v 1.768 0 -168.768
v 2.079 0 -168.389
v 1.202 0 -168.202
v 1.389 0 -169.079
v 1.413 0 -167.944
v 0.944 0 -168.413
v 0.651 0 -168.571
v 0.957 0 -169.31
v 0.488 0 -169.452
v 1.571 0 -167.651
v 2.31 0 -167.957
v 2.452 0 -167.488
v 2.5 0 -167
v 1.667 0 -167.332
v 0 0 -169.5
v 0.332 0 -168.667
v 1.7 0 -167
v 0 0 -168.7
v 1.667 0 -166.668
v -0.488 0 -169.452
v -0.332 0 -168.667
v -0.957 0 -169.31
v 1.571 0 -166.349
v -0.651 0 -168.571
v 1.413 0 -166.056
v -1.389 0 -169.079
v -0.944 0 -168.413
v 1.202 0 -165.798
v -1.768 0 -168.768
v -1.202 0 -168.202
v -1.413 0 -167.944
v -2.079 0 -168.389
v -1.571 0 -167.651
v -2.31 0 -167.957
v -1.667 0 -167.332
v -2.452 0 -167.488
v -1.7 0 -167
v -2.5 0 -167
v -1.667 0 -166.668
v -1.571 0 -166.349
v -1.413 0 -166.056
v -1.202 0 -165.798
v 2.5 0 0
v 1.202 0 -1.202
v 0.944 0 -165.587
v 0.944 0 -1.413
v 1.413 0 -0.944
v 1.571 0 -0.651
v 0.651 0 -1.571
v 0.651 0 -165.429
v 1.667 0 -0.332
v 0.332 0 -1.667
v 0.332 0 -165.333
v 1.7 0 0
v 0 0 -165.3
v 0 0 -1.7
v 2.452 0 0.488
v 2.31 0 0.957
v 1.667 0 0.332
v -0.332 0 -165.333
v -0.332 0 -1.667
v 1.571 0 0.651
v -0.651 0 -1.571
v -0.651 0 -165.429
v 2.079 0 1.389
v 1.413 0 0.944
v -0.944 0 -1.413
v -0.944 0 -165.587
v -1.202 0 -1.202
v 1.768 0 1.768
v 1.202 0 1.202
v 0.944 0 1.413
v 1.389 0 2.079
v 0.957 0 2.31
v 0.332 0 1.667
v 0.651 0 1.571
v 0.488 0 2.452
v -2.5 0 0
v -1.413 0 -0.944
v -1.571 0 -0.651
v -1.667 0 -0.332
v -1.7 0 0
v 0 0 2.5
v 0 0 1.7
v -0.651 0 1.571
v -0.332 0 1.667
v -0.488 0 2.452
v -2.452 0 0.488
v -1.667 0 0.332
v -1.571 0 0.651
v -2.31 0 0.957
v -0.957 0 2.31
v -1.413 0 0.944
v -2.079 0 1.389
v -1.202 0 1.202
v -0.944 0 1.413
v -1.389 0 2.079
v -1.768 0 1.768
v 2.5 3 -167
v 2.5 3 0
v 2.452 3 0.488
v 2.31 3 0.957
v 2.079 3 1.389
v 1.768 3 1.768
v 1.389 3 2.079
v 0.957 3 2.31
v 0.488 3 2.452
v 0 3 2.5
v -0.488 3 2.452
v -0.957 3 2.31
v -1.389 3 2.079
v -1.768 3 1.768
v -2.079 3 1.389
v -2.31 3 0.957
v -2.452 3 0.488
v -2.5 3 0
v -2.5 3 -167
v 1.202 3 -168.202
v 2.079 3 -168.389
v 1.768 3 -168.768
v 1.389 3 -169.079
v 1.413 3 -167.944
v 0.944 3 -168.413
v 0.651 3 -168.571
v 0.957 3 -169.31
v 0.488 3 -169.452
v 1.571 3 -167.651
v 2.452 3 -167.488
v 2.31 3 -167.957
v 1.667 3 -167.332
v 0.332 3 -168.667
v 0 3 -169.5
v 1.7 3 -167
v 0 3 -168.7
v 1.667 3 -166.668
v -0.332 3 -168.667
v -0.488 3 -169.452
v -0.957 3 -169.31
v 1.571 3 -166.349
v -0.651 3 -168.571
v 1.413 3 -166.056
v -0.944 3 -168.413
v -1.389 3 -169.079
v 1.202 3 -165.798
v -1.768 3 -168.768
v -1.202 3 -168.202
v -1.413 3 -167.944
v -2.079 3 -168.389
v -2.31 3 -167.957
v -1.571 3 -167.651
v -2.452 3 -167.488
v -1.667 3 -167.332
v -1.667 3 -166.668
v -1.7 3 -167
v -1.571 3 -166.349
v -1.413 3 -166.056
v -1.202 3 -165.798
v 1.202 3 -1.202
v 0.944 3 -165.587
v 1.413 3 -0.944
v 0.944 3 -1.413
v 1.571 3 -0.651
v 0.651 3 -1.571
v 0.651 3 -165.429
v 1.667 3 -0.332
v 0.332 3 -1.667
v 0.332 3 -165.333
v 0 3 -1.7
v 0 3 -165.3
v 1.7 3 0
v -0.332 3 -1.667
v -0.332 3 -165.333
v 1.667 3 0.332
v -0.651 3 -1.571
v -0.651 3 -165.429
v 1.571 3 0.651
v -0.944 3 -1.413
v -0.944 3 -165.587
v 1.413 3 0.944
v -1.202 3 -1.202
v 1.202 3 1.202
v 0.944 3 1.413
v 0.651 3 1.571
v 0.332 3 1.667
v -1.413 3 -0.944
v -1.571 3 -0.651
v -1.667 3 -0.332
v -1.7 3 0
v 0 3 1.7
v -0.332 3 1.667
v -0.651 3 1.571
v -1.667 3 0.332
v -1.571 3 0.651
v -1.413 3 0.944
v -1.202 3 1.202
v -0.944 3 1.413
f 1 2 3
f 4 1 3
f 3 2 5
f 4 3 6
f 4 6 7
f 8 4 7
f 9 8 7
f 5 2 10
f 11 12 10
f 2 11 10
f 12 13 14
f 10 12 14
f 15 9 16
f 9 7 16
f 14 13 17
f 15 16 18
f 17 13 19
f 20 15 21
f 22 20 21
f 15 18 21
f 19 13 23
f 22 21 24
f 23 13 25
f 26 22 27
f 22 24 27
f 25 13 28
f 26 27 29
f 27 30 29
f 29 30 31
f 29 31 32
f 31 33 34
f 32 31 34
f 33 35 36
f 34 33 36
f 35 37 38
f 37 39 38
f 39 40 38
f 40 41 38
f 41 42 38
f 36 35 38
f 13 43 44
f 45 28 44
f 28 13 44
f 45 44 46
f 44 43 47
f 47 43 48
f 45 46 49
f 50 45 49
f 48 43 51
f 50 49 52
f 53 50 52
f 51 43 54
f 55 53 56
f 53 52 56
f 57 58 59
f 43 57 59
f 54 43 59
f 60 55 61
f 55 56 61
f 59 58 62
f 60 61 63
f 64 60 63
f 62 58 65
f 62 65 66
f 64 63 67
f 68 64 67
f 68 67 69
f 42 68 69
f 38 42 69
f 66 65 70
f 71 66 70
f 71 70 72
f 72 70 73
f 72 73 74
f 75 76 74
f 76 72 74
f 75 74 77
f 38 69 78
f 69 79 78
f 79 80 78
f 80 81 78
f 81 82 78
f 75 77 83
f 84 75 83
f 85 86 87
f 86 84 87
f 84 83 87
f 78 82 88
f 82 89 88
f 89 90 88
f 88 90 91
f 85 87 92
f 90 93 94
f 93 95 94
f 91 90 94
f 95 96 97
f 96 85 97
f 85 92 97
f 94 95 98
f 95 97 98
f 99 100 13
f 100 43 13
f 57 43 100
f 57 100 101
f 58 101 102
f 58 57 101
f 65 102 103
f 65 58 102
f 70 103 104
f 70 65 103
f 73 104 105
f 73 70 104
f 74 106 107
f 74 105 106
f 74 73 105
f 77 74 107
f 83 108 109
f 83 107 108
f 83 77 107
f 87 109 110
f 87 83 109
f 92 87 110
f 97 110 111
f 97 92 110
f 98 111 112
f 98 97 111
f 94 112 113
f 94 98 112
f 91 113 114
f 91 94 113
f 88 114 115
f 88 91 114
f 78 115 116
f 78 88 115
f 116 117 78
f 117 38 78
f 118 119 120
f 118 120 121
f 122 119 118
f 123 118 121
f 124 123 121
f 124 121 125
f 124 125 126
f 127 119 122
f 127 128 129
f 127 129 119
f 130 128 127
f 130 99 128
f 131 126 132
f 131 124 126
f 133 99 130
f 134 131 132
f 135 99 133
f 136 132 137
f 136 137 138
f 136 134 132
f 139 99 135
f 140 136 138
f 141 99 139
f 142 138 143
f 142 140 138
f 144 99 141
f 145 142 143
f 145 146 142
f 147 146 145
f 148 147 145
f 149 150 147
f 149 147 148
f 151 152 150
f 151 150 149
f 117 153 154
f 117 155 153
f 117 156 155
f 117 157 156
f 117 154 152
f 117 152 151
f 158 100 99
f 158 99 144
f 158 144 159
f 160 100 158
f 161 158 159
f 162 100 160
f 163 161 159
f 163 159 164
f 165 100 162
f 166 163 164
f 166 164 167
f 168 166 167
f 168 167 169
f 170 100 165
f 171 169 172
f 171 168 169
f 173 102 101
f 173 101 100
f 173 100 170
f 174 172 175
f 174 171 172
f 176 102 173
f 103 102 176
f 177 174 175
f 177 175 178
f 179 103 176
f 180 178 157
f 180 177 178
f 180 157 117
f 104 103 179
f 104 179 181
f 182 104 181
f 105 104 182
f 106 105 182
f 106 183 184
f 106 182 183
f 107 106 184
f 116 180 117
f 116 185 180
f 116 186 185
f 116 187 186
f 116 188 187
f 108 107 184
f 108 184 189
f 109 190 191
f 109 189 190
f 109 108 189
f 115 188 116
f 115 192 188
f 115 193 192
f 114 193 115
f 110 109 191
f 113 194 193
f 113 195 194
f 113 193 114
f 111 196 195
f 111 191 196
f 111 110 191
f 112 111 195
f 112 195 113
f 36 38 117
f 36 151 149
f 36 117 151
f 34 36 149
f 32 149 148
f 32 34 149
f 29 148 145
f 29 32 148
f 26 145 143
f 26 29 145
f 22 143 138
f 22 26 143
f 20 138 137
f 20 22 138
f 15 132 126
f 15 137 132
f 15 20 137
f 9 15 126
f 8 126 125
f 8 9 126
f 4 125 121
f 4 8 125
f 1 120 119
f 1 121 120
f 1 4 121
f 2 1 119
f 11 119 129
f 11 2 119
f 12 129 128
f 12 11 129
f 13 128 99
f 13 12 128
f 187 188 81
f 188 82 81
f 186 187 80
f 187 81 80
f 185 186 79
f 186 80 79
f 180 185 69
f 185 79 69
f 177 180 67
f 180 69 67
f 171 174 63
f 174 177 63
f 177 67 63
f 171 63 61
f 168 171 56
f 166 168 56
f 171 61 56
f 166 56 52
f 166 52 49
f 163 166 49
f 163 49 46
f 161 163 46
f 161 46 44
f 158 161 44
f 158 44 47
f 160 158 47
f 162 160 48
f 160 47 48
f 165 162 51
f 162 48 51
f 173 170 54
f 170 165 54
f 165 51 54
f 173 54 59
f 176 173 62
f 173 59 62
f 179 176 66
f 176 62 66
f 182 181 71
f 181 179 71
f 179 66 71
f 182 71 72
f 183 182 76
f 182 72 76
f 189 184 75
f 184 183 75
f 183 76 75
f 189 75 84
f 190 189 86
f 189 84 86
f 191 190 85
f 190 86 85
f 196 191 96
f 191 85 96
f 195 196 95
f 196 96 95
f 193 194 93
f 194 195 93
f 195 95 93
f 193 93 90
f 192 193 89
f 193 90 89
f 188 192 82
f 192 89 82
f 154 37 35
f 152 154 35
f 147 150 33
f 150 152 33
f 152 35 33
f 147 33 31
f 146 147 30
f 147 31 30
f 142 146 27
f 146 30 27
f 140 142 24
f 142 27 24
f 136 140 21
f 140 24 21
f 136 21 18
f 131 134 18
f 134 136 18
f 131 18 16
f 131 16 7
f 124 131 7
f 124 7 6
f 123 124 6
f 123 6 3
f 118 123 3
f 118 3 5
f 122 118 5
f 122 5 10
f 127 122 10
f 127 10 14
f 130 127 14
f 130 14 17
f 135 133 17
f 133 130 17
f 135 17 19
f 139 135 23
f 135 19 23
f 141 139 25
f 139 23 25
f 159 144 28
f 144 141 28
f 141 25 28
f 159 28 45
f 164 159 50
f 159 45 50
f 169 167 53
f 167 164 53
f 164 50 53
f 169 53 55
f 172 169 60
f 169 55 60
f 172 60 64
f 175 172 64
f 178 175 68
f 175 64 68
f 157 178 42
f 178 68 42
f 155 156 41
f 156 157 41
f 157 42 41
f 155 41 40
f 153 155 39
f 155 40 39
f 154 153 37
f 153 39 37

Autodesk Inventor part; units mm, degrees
ref_plane "YZ Plane" through (0, 0, 0) normal (1, 0, 0) x (0, 1, 0)
ref_plane "XZ Plane" through (0, 0, 0) normal (0, 1, 0) x (-1, 0, 0)
ref_plane "XY Plane" through (0, 0, 0) normal (0, 0, 1) x (1, 0, 0)
sketch "Sketch1" plane through (0, 0, 0) normal (0, 1, 0) x (-1, 0, 0)
  line L0 (0, 0) -> (0, -167)
  circle A0 centre (0, 0) radius 1.7
  circle A1 centre (0, -167) radius 1.7
  circle A2 centre (0, 0) radius 2.5
  circle A3 centre (0, -167) radius 2.5
  line L1 (2.5, -167) -> (2.5, 0)
  line L2 (-2.5, 0) -> (-2.5, -167)
  dimension "d0" = 167
  dimension "d1" = 3.4
  dimension "d2" = 3.4
  dimension "d3" = 5
  dimension "d4" = 5
extrude "Extrusion1" add sketch "Sketch1" along normal blind 3
properties part number "HENK"
